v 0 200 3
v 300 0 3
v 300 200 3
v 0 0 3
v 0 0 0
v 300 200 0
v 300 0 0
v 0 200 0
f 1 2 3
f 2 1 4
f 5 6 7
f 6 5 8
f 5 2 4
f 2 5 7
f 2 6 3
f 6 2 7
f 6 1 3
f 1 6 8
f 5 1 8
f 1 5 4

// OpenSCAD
$fn = 64;

length = 300;
width  = 200;
thickness = 3;

color([0.85, 0.85, 0.85])
cube([length, width, thickness], center=false);
